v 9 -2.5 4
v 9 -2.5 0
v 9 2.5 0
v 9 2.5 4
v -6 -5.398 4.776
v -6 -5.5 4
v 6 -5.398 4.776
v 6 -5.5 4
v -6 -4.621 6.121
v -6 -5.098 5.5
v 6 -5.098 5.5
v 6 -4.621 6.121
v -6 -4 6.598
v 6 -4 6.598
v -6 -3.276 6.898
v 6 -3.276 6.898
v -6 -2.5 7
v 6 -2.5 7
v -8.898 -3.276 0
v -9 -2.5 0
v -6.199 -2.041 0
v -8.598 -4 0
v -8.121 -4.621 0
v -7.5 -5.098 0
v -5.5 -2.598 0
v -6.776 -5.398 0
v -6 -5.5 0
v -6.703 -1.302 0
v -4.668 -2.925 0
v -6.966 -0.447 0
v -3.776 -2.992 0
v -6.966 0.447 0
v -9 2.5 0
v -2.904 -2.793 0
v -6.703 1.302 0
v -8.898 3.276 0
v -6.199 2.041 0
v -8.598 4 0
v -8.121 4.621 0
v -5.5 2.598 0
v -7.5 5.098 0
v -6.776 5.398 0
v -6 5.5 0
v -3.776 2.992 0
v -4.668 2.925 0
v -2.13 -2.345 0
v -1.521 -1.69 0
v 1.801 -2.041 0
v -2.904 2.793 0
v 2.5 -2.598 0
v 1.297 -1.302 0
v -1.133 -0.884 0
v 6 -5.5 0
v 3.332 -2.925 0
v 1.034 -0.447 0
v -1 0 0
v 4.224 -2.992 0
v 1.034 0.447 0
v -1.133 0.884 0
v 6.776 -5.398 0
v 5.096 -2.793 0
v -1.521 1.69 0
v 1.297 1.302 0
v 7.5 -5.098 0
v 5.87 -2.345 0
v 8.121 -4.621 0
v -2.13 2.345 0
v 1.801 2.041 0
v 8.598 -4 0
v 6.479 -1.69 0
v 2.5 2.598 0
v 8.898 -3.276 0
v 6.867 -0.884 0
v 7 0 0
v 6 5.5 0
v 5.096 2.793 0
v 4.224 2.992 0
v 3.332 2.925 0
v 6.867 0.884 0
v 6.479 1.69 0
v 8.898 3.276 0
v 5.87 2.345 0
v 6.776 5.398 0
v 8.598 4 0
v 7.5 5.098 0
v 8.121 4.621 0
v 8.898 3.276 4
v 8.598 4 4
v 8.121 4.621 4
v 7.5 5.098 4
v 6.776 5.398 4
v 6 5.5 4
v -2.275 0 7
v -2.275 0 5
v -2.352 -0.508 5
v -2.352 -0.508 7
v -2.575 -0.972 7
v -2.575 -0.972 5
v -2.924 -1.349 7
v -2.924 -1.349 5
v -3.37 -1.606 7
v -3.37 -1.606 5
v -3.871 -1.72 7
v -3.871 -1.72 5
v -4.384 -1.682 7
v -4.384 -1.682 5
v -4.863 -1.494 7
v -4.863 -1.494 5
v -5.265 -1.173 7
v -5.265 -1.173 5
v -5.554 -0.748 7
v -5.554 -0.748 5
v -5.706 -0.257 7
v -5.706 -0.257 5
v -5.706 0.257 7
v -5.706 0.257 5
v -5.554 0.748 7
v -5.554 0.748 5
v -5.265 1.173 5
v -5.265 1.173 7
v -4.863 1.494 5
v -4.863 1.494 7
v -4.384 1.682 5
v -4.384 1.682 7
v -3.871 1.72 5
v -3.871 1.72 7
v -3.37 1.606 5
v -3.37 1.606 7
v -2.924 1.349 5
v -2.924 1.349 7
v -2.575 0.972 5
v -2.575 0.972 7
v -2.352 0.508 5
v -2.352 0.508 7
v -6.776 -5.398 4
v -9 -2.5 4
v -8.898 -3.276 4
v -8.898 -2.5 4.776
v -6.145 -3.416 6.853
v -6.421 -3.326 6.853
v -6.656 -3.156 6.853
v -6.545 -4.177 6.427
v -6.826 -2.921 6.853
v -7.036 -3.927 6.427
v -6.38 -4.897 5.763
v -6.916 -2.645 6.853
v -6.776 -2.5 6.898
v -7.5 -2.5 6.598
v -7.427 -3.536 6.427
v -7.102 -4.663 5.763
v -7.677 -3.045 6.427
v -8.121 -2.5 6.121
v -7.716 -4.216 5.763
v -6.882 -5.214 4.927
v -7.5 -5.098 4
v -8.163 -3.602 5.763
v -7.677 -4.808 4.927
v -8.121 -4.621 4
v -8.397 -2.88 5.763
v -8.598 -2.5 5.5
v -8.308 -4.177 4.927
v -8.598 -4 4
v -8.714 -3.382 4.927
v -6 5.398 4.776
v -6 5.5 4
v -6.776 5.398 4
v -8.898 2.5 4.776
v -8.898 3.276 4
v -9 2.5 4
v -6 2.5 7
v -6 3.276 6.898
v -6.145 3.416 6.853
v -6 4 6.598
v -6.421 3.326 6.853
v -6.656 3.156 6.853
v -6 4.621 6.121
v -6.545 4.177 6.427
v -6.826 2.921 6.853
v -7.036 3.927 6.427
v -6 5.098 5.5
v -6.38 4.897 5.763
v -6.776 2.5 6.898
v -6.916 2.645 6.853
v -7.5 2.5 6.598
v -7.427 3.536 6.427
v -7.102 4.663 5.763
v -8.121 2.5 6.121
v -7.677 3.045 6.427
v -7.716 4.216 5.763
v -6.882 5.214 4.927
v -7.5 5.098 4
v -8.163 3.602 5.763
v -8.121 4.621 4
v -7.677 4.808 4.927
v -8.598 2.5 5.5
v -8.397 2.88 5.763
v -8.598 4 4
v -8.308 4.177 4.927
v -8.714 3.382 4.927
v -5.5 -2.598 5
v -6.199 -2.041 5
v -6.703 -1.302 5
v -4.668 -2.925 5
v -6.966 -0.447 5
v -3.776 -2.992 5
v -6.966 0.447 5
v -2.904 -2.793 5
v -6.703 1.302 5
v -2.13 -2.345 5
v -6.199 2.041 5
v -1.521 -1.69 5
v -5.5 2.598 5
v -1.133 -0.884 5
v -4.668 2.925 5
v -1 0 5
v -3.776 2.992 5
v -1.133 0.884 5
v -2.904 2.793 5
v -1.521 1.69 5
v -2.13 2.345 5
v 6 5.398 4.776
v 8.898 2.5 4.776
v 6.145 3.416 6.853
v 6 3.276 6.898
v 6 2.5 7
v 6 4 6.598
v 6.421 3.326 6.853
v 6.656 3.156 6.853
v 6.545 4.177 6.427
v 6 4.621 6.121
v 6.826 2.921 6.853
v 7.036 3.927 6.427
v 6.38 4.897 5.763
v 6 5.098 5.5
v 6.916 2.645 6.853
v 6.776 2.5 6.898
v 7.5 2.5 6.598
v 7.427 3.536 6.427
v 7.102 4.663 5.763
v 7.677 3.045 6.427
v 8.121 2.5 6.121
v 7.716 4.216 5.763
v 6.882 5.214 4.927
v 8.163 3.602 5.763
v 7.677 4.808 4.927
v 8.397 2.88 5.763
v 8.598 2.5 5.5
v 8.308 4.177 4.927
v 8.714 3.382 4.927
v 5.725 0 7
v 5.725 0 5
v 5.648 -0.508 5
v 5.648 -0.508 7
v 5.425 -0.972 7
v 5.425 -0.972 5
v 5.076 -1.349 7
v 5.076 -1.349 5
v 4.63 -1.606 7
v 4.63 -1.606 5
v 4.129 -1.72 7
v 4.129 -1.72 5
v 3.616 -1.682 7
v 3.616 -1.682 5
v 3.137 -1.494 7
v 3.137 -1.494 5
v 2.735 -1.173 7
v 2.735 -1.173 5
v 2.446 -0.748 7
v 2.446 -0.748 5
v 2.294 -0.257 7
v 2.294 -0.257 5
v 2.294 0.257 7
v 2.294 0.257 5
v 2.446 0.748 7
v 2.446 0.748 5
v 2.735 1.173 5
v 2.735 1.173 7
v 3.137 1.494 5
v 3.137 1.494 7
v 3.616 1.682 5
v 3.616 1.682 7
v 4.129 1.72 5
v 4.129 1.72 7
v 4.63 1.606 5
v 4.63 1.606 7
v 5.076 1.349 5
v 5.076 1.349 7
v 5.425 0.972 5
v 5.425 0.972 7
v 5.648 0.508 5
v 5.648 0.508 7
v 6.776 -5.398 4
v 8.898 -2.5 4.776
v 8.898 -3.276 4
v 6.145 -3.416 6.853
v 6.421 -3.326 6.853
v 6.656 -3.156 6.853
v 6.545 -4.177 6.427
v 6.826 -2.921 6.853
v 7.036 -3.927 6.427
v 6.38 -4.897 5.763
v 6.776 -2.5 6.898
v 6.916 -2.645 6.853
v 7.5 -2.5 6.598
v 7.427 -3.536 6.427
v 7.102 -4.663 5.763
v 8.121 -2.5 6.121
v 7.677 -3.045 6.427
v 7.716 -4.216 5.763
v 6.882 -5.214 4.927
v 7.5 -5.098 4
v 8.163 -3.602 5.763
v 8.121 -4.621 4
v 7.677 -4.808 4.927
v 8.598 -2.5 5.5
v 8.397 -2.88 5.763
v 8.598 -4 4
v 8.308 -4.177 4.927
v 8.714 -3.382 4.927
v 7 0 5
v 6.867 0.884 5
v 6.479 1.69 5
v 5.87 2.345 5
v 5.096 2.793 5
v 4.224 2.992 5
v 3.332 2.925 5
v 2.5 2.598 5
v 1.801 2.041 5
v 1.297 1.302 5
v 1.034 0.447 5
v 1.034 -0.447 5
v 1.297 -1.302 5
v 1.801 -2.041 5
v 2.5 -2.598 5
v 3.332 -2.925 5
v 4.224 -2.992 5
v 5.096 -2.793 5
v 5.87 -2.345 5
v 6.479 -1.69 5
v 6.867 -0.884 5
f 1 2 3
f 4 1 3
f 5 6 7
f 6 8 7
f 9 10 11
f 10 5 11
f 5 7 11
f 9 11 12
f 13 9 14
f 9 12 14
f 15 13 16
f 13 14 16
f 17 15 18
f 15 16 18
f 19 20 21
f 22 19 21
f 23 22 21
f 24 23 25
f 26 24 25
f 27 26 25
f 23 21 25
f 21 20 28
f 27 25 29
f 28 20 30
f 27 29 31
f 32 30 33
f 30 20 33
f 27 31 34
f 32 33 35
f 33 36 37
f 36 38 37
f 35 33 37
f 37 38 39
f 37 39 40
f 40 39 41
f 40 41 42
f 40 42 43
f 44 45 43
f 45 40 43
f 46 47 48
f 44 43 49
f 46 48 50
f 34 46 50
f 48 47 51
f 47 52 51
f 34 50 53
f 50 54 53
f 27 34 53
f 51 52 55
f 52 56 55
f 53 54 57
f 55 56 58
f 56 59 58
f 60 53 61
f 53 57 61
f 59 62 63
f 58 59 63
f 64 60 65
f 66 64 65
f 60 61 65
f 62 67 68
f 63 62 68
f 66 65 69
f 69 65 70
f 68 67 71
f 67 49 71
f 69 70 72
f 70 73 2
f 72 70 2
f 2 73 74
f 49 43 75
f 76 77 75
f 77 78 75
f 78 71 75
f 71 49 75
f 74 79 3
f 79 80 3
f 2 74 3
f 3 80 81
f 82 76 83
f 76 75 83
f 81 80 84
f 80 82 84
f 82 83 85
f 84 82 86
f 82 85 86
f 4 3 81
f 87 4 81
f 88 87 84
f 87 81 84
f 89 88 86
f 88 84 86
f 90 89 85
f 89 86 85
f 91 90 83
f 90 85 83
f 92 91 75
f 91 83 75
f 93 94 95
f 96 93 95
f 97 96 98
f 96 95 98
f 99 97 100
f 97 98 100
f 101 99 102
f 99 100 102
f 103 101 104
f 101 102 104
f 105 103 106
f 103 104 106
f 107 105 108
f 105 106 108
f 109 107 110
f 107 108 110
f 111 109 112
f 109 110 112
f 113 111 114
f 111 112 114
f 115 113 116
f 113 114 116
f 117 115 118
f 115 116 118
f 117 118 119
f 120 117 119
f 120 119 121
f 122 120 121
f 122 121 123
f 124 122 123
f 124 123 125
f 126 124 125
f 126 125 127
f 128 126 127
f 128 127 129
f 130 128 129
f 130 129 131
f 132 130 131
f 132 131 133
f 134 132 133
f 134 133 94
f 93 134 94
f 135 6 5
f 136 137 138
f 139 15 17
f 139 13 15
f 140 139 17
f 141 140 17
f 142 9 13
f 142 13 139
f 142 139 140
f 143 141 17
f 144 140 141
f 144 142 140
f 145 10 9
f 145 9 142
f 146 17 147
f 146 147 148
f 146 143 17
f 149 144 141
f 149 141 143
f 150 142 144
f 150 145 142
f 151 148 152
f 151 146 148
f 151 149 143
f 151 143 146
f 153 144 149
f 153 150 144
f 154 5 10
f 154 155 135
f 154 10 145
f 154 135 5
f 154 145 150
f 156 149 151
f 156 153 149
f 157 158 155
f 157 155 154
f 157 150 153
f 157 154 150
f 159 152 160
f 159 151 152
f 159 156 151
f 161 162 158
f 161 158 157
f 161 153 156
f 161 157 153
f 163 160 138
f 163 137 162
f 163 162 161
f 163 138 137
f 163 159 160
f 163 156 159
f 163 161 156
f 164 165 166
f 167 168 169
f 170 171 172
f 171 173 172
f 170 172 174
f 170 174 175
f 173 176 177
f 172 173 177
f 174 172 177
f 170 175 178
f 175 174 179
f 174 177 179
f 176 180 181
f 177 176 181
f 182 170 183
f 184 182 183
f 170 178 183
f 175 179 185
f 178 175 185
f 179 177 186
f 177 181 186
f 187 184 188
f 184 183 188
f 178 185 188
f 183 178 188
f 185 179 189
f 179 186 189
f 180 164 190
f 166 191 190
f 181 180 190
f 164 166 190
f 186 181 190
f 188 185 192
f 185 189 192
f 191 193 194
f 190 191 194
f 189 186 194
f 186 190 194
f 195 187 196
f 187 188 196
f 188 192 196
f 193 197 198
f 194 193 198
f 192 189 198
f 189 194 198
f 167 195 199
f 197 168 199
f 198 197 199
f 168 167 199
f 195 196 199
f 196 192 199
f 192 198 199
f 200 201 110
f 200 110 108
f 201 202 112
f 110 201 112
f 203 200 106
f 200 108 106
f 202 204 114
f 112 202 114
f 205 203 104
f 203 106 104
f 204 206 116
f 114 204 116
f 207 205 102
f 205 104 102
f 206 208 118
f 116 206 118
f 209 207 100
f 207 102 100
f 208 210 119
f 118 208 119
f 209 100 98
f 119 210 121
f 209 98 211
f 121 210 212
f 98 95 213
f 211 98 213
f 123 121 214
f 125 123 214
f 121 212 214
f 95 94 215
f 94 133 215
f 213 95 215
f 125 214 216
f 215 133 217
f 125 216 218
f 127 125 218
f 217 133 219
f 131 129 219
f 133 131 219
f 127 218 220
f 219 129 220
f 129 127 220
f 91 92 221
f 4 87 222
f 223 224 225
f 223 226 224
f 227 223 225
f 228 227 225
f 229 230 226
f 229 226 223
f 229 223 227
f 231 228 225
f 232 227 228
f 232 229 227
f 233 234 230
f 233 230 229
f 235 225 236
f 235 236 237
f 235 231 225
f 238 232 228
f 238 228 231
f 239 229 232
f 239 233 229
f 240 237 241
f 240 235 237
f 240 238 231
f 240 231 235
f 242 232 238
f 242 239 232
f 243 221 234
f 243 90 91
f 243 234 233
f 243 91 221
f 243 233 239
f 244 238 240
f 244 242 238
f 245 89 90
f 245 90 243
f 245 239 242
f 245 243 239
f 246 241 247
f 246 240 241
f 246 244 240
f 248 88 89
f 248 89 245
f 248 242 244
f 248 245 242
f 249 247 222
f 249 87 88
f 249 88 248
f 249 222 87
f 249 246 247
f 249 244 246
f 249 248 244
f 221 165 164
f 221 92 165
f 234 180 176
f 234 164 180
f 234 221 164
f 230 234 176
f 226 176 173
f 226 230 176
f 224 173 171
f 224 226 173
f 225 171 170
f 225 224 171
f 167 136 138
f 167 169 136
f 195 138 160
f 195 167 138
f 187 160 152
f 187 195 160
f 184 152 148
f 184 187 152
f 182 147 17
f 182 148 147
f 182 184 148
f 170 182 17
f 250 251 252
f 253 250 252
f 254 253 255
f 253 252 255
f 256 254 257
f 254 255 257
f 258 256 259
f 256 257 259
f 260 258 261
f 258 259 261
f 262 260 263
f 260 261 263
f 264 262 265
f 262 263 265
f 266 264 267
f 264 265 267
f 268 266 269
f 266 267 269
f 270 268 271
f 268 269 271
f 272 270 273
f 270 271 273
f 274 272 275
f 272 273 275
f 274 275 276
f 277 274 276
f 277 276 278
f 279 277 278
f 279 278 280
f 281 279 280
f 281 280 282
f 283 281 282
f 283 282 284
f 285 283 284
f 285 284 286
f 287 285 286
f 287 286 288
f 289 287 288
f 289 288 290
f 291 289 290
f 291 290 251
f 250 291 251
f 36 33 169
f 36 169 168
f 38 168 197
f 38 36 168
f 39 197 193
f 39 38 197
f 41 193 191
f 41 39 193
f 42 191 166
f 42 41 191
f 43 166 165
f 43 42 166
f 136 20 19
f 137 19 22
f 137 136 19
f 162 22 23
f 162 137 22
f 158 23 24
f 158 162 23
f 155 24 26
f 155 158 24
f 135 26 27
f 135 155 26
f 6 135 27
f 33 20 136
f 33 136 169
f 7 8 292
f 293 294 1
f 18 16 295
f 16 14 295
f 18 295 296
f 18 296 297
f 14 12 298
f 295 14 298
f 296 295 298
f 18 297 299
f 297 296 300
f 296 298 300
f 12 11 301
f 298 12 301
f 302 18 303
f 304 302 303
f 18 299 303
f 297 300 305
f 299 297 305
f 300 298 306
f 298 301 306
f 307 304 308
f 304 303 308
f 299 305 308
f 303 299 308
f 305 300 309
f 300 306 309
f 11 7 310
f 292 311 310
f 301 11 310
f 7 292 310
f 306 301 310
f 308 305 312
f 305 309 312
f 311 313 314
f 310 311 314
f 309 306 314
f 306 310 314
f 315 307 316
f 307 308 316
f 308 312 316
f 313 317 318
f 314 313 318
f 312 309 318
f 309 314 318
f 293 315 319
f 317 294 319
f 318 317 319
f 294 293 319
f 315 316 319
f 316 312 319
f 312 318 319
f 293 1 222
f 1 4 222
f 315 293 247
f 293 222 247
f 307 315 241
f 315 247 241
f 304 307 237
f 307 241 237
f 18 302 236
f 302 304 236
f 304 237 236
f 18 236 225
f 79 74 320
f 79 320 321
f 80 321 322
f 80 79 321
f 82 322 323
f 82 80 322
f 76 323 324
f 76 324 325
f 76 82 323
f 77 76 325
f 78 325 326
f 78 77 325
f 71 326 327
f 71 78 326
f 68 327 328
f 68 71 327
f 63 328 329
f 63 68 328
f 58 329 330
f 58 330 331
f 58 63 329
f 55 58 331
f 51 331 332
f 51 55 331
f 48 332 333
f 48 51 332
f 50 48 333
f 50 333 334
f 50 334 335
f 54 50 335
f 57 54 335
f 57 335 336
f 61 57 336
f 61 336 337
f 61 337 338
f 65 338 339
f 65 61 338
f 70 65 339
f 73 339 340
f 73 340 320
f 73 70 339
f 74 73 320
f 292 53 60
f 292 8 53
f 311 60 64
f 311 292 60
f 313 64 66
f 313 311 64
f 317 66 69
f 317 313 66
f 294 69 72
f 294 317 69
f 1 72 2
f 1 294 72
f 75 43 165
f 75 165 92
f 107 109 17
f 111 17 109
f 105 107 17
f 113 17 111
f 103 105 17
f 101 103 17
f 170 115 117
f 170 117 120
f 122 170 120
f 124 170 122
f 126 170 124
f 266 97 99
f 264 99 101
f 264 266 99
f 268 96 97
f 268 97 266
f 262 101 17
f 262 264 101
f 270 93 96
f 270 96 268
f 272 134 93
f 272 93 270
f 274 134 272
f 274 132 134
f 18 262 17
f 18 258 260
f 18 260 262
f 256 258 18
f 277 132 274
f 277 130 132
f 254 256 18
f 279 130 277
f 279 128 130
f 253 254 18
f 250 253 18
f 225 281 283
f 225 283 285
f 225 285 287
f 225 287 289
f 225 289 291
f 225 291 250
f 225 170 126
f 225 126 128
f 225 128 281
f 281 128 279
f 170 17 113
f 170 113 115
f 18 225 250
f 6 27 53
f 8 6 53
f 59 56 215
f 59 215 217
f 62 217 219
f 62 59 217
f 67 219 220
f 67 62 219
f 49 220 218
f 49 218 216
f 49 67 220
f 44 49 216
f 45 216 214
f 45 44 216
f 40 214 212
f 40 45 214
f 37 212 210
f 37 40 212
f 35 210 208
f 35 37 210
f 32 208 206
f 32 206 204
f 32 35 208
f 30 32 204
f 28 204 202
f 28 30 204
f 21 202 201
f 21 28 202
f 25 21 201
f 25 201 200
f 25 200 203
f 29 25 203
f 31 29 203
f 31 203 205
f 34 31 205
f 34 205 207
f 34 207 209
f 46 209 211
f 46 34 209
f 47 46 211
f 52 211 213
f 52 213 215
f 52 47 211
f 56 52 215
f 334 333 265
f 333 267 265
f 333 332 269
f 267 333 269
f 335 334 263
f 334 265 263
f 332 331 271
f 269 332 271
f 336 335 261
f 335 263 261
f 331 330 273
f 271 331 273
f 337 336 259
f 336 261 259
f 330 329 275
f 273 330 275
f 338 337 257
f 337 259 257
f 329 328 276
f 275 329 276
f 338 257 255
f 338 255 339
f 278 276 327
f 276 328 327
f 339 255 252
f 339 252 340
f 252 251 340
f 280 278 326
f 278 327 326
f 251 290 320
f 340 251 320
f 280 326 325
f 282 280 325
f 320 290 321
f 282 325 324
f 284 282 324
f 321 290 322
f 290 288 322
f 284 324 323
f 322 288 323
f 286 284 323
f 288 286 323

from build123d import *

# Parameters (mm, degrees)
F0_W     = 18
F0_H     = 11
F0_R     = 3
F1_DEPTH = 5
F2_W     = 18
F2_H     = 11
F3_DEPTH = 2
F4_R     = 3
F5_R     = 1.725
F6_DEPTH = 25


with BuildPart() as f1:
    # F0 (on Top) → F1 (new body)
    with BuildSketch(Plane.XY):
        Rectangle(F0_W, F0_H)
        with Locations((-4, 0)):
            Circle(F0_R, mode=Mode.SUBTRACT)
        with Locations((4, 0)):
            Circle(F0_R, mode=Mode.SUBTRACT)
    extrude(amount=F1_DEPTH)

    # F2 (on face) → F3 (join)
    with BuildSketch(Plane.XY.offset(5)):
        Rectangle(F2_W, F2_H)
    extrude(amount=F3_DEPTH)

    # F4
    f4_edges = [f1.edges().sort_by_distance(p)[0] for p in [
        (-9, 5.5, 3.5),
        (-9, -5.5, 3.5),
        (9, -5.5, 3.5),
        (9, 5.5, 3.5),
        (0, 5.5, 7),
        (0, -5.5, 7),
        (-9, 0, 7),
        (9, 0, 7),
    ]]
    fillet(f4_edges, radius=F4_R)

    # F5 (on face) → F6 (cut)
    with BuildSketch(Plane(origin=(0, 0, 5), x_dir=(1, 0, 0), z_dir=(0, 0, -1))):
        with Locations((-4, 0)):
            Circle(F5_R)
        with Locations((4, 0)):
            Circle(F5_R)
    extrude(amount=-F6_DEPTH, mode=Mode.SUBTRACT)


solid = f1.part
